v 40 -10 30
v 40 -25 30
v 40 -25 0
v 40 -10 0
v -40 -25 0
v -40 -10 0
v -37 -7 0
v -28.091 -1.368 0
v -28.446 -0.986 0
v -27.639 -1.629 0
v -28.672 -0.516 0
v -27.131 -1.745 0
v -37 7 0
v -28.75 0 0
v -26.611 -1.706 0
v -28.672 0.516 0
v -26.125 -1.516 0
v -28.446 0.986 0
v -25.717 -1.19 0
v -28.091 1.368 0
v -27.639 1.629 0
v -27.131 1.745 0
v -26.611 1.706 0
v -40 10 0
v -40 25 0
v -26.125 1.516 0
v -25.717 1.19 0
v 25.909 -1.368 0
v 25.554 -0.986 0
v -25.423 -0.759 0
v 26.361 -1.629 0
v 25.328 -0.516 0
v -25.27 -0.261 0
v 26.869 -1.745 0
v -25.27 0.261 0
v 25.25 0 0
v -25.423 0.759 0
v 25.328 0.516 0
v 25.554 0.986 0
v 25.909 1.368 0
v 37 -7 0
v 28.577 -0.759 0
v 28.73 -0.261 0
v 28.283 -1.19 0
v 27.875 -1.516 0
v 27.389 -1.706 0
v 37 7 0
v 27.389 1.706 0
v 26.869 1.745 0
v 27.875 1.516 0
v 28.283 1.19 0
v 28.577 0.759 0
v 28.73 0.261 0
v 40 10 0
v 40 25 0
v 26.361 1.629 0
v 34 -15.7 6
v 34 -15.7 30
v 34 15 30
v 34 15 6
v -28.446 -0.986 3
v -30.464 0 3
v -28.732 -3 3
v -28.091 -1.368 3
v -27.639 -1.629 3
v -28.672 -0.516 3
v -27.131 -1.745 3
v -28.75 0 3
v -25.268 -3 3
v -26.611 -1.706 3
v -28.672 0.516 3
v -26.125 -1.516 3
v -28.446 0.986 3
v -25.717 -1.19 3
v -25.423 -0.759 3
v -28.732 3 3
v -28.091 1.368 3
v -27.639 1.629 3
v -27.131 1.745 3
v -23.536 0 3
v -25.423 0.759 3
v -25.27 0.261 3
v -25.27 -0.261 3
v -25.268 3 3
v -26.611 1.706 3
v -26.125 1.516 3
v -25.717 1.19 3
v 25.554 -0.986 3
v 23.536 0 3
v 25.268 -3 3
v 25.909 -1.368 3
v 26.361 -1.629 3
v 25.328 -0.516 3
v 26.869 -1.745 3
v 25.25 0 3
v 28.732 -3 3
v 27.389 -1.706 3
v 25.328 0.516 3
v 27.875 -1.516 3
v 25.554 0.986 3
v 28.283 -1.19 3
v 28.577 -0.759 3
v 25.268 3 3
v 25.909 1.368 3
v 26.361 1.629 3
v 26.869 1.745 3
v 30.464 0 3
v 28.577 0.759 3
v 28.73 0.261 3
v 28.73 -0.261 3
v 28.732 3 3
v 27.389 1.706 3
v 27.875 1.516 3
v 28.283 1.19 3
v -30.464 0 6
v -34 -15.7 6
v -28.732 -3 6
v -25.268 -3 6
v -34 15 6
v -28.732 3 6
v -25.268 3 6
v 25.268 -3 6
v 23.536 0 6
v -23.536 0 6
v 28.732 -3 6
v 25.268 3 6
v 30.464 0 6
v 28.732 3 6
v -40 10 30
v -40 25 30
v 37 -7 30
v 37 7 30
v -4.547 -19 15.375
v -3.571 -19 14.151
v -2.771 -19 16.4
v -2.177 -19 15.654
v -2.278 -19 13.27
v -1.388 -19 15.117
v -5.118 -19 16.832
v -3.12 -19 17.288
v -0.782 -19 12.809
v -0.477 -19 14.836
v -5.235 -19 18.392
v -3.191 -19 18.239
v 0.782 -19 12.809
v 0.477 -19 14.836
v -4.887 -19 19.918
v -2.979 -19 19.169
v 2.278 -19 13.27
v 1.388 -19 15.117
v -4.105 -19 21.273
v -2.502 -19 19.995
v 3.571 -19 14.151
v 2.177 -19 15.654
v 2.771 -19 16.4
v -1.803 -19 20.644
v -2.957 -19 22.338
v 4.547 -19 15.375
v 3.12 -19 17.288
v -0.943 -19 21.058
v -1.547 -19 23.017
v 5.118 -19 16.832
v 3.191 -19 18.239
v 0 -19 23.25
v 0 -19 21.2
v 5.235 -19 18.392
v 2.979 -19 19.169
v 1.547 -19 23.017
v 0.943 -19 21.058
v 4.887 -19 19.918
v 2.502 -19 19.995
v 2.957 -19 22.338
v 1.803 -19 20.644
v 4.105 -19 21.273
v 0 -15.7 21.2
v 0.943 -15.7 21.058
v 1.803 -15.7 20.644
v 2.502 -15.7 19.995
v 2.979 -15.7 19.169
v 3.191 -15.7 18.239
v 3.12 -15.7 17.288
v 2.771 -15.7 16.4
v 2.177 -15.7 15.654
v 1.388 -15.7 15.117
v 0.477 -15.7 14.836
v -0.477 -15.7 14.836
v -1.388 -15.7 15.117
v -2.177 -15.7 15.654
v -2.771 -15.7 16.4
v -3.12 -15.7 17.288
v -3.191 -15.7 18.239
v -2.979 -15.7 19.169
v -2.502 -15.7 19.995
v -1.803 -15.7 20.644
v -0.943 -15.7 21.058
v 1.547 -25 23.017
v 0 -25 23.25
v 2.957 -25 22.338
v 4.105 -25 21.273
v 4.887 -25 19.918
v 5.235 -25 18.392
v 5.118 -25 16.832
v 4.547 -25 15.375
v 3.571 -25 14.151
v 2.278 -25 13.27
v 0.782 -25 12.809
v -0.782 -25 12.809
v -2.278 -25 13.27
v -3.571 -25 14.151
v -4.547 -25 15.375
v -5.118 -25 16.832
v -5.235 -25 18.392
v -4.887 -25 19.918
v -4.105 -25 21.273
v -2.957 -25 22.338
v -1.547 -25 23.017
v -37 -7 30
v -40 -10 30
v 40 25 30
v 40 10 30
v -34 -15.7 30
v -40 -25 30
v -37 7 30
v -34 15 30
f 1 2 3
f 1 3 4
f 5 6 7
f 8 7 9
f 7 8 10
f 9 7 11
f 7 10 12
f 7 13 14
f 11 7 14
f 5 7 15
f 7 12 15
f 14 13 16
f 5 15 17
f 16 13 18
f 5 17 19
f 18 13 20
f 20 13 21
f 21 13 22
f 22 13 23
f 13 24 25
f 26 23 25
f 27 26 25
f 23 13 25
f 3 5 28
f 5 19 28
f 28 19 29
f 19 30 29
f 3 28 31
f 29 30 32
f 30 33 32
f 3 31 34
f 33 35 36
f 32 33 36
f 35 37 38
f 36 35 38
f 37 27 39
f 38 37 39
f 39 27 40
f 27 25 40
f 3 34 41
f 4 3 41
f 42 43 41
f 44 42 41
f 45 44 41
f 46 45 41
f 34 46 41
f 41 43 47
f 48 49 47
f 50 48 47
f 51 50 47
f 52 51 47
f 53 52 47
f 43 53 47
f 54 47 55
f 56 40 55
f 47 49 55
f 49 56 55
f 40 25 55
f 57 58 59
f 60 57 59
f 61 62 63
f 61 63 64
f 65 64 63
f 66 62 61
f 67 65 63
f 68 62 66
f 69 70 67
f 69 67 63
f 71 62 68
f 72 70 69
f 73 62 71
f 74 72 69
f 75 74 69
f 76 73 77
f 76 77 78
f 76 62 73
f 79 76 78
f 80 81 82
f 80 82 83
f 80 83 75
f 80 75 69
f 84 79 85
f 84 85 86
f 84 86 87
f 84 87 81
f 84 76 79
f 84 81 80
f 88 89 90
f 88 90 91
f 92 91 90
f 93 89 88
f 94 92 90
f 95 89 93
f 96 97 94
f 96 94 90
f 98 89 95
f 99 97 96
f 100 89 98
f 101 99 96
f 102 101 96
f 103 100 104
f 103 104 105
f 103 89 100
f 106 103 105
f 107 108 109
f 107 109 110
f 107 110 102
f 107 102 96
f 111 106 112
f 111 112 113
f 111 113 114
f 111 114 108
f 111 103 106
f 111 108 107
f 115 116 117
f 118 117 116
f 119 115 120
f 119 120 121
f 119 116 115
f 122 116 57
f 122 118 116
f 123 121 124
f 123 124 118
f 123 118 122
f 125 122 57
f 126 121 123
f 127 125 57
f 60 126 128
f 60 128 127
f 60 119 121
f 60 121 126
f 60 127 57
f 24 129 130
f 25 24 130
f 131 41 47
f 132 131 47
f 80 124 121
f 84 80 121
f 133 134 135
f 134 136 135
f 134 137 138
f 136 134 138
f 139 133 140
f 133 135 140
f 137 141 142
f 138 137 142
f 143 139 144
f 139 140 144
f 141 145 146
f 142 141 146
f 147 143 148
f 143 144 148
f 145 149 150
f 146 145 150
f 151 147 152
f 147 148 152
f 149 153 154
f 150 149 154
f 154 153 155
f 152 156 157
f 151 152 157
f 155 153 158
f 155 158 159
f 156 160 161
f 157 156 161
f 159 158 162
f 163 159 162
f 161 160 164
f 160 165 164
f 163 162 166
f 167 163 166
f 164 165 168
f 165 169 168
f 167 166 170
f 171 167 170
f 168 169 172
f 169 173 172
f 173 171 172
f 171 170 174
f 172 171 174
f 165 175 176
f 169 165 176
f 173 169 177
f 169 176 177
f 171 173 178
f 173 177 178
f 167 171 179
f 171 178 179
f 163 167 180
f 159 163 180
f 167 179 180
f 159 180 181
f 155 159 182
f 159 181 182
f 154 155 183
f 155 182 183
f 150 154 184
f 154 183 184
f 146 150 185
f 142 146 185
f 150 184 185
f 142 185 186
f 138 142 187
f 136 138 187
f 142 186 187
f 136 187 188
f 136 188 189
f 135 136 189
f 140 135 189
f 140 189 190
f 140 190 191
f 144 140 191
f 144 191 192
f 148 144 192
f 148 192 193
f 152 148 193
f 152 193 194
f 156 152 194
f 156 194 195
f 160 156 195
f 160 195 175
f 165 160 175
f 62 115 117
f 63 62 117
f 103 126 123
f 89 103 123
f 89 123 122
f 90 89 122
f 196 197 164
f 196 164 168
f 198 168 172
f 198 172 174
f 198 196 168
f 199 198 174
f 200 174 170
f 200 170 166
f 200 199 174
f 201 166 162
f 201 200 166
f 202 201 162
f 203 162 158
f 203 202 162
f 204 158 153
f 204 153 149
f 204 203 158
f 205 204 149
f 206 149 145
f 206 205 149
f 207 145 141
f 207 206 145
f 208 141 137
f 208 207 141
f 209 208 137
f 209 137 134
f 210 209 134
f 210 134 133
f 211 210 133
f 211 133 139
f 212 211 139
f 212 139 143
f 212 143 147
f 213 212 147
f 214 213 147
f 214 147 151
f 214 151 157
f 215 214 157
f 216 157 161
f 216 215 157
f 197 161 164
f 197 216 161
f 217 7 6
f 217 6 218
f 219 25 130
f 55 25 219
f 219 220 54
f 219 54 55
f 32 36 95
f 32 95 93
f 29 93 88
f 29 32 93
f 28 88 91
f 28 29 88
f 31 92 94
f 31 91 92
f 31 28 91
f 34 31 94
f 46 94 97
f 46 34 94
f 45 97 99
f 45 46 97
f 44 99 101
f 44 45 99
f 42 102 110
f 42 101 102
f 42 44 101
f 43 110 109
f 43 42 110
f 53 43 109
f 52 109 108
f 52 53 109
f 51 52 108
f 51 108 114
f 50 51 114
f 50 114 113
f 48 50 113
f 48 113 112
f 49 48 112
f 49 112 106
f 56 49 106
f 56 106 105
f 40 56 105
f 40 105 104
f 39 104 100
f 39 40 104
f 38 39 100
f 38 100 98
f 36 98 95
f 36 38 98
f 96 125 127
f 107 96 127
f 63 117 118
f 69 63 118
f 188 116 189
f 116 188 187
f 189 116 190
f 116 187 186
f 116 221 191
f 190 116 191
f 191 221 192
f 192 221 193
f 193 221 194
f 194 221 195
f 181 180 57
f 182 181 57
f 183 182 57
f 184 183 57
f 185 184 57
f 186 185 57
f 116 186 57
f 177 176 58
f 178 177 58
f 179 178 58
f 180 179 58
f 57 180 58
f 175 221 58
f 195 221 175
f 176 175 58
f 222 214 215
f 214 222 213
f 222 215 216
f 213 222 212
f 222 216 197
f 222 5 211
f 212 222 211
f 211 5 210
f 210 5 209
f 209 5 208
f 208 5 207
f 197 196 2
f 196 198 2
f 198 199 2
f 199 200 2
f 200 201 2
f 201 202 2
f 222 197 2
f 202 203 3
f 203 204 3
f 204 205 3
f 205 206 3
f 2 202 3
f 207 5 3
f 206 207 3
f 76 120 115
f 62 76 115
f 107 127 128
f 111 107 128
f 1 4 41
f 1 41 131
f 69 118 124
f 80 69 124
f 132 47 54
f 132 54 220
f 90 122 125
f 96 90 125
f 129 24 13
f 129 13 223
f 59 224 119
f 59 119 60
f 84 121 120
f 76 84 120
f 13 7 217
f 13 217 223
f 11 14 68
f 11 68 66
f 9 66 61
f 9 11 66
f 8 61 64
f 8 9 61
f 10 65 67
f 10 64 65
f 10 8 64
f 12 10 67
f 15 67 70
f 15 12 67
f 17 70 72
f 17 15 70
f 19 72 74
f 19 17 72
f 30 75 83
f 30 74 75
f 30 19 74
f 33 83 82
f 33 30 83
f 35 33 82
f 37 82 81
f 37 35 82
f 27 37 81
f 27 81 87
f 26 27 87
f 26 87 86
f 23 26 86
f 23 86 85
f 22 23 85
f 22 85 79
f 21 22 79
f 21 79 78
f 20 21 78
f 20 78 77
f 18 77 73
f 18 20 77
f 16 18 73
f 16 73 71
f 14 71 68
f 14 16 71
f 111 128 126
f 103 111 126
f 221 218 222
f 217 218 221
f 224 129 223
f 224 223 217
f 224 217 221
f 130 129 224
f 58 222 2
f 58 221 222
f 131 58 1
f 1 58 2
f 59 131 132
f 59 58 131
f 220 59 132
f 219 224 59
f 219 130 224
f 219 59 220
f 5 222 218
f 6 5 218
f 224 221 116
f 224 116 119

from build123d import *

# Parameters (mm, degrees)
SKETCH1_W               = 80
SKETCH1_H               = 50
BOSS_EXTRUDE1_DEPTH     = 30
CUT_EXTRUDE1_DEPTH      = 56.901699437
CUT_EXTRUDE1_DEPTH_BACK = 56.901699437
SKETCH2_W               = 6
SKETCH2_H               = 20
CHAMFER1_SIZE           = 3
CUT_EXTRUDE2_START      = 30
SKETCH3_W               = 68
SKETCH3_H               = 30
CUT_EXTRUDE2_DEPTH      = 24
SKETCH4_R               = 3.2
CUT_EXTRUDE3_DEPTH      = 56.901699437
CUT_EXTRUDE4_DEPTH      = 56.901699437
CUT_EXTRUDE4_DEPTH_BACK = 56.901699437
SKETCH5_R               = 1.75
CUT_EXTRUDE5_START      = 6
CUT_EXTRUDE5_DEPTH      = 3
CUT_EXTRUDE6_START      = -25
SKETCH7_R               = 5.25
CUT_EXTRUDE6_DEPTH      = 6
CUT_EXTRUDE8_START      = 30
SKETCH10_W              = 68
SKETCH10_H              = 0.7
CUT_EXTRUDE8_DEPTH      = 24


with BuildPart() as part:
    # Sketch1 → Boss-Extrude1 (new body)
    with BuildSketch(Plane.XY):
        Rectangle(SKETCH1_W, SKETCH1_H)
    extrude(amount=BOSS_EXTRUDE1_DEPTH)

    # Sketch2 → Cut-Extrude1 (cut, two sides: drawn at the far end of the back side and taken through both)
    with BuildSketch(Plane.XY.offset(-CUT_EXTRUDE1_DEPTH_BACK)):
        with Locations((-40, 0)):
            Rectangle(SKETCH2_W, SKETCH2_H)
        with Locations((40, 0)):
            Rectangle(SKETCH2_W, SKETCH2_H)
    extrude(amount=CUT_EXTRUDE1_DEPTH + CUT_EXTRUDE1_DEPTH_BACK, mode=Mode.SUBTRACT)

    # Chamfer1
    chamfer1_edges = [part.edges().sort_by_distance(p)[0] for p in [
        (37, 10, 15),
        (37, -10, 15),
        (-37, -10, 15),
        (-37, 10, 15),
    ]]
    chamfer(chamfer1_edges, length=CHAMFER1_SIZE - 0.0001)  # a hair under: the kernel refuses the full size

    # Sketch3 → Cut-Extrude2 (cut)
    with BuildSketch(Plane.XY.offset(CUT_EXTRUDE2_START)):
        Rectangle(SKETCH3_W, SKETCH3_H)
    extrude(amount=-CUT_EXTRUDE2_DEPTH, mode=Mode.SUBTRACT)

    # Sketch4 → Cut-Extrude3 (cut, through all)
    with BuildSketch(Plane(origin=(0, 0, 0), x_dir=(1, 0, 0), z_dir=(0, 1, 0))):
        with Locations(Location((0, -18, 0), (0, 0, 270))):
            Circle(SKETCH4_R)
    extrude(amount=-CUT_EXTRUDE3_DEPTH, mode=Mode.SUBTRACT)

    # Sketch5 → Cut-Extrude4 (cut, two sides: drawn at the far end of the back side and taken through both)
    with BuildSketch(Plane.XY.offset(-CUT_EXTRUDE4_DEPTH_BACK)):
        with Locations(Location((27, 0, 0), (0, 0, 180))):
            Circle(SKETCH5_R)
        with Locations(Location((-27, 0, 0), (0, 0, 180))):
            Circle(SKETCH5_R)
    extrude(amount=CUT_EXTRUDE4_DEPTH + CUT_EXTRUDE4_DEPTH_BACK, mode=Mode.SUBTRACT)

    # Sketch6 → Cut-Extrude5 (cut)
    with BuildSketch(Plane.XY.offset(CUT_EXTRUDE5_START)):
        Polygon((-23.535898385, 0), (-25.267949192, 3), (-28.732050808, 3), (-30.464101615, 0), (-28.732050808, -3), (-25.267949192, -3), align=None)
        Polygon((30.464101615, 0), (28.732050808, 3), (25.267949192, 3), (23.535898385, 0), (25.267949192, -3), (28.732050808, -3), align=None)
    extrude(amount=-CUT_EXTRUDE5_DEPTH, mode=Mode.SUBTRACT)

    # Sketch7 → Cut-Extrude6 (cut)
    with BuildSketch(Plane(origin=(0, 0, 0), x_dir=(1, 0, 0), z_dir=(0, 1, 0)).offset(CUT_EXTRUDE6_START)):
        with Locations(Location((0, -18, 0), (0, 0, 270))):
            Circle(SKETCH7_R)
    extrude(amount=CUT_EXTRUDE6_DEPTH, mode=Mode.SUBTRACT)

    # Sketch10 → Cut-Extrude8 (cut)
    with BuildSketch(Plane.XY.offset(CUT_EXTRUDE8_START)):
        with Locations((0, -15.35)):
            Rectangle(SKETCH10_W, SKETCH10_H)
    extrude(amount=-CUT_EXTRUDE8_DEPTH, mode=Mode.SUBTRACT)


solid = part.part
